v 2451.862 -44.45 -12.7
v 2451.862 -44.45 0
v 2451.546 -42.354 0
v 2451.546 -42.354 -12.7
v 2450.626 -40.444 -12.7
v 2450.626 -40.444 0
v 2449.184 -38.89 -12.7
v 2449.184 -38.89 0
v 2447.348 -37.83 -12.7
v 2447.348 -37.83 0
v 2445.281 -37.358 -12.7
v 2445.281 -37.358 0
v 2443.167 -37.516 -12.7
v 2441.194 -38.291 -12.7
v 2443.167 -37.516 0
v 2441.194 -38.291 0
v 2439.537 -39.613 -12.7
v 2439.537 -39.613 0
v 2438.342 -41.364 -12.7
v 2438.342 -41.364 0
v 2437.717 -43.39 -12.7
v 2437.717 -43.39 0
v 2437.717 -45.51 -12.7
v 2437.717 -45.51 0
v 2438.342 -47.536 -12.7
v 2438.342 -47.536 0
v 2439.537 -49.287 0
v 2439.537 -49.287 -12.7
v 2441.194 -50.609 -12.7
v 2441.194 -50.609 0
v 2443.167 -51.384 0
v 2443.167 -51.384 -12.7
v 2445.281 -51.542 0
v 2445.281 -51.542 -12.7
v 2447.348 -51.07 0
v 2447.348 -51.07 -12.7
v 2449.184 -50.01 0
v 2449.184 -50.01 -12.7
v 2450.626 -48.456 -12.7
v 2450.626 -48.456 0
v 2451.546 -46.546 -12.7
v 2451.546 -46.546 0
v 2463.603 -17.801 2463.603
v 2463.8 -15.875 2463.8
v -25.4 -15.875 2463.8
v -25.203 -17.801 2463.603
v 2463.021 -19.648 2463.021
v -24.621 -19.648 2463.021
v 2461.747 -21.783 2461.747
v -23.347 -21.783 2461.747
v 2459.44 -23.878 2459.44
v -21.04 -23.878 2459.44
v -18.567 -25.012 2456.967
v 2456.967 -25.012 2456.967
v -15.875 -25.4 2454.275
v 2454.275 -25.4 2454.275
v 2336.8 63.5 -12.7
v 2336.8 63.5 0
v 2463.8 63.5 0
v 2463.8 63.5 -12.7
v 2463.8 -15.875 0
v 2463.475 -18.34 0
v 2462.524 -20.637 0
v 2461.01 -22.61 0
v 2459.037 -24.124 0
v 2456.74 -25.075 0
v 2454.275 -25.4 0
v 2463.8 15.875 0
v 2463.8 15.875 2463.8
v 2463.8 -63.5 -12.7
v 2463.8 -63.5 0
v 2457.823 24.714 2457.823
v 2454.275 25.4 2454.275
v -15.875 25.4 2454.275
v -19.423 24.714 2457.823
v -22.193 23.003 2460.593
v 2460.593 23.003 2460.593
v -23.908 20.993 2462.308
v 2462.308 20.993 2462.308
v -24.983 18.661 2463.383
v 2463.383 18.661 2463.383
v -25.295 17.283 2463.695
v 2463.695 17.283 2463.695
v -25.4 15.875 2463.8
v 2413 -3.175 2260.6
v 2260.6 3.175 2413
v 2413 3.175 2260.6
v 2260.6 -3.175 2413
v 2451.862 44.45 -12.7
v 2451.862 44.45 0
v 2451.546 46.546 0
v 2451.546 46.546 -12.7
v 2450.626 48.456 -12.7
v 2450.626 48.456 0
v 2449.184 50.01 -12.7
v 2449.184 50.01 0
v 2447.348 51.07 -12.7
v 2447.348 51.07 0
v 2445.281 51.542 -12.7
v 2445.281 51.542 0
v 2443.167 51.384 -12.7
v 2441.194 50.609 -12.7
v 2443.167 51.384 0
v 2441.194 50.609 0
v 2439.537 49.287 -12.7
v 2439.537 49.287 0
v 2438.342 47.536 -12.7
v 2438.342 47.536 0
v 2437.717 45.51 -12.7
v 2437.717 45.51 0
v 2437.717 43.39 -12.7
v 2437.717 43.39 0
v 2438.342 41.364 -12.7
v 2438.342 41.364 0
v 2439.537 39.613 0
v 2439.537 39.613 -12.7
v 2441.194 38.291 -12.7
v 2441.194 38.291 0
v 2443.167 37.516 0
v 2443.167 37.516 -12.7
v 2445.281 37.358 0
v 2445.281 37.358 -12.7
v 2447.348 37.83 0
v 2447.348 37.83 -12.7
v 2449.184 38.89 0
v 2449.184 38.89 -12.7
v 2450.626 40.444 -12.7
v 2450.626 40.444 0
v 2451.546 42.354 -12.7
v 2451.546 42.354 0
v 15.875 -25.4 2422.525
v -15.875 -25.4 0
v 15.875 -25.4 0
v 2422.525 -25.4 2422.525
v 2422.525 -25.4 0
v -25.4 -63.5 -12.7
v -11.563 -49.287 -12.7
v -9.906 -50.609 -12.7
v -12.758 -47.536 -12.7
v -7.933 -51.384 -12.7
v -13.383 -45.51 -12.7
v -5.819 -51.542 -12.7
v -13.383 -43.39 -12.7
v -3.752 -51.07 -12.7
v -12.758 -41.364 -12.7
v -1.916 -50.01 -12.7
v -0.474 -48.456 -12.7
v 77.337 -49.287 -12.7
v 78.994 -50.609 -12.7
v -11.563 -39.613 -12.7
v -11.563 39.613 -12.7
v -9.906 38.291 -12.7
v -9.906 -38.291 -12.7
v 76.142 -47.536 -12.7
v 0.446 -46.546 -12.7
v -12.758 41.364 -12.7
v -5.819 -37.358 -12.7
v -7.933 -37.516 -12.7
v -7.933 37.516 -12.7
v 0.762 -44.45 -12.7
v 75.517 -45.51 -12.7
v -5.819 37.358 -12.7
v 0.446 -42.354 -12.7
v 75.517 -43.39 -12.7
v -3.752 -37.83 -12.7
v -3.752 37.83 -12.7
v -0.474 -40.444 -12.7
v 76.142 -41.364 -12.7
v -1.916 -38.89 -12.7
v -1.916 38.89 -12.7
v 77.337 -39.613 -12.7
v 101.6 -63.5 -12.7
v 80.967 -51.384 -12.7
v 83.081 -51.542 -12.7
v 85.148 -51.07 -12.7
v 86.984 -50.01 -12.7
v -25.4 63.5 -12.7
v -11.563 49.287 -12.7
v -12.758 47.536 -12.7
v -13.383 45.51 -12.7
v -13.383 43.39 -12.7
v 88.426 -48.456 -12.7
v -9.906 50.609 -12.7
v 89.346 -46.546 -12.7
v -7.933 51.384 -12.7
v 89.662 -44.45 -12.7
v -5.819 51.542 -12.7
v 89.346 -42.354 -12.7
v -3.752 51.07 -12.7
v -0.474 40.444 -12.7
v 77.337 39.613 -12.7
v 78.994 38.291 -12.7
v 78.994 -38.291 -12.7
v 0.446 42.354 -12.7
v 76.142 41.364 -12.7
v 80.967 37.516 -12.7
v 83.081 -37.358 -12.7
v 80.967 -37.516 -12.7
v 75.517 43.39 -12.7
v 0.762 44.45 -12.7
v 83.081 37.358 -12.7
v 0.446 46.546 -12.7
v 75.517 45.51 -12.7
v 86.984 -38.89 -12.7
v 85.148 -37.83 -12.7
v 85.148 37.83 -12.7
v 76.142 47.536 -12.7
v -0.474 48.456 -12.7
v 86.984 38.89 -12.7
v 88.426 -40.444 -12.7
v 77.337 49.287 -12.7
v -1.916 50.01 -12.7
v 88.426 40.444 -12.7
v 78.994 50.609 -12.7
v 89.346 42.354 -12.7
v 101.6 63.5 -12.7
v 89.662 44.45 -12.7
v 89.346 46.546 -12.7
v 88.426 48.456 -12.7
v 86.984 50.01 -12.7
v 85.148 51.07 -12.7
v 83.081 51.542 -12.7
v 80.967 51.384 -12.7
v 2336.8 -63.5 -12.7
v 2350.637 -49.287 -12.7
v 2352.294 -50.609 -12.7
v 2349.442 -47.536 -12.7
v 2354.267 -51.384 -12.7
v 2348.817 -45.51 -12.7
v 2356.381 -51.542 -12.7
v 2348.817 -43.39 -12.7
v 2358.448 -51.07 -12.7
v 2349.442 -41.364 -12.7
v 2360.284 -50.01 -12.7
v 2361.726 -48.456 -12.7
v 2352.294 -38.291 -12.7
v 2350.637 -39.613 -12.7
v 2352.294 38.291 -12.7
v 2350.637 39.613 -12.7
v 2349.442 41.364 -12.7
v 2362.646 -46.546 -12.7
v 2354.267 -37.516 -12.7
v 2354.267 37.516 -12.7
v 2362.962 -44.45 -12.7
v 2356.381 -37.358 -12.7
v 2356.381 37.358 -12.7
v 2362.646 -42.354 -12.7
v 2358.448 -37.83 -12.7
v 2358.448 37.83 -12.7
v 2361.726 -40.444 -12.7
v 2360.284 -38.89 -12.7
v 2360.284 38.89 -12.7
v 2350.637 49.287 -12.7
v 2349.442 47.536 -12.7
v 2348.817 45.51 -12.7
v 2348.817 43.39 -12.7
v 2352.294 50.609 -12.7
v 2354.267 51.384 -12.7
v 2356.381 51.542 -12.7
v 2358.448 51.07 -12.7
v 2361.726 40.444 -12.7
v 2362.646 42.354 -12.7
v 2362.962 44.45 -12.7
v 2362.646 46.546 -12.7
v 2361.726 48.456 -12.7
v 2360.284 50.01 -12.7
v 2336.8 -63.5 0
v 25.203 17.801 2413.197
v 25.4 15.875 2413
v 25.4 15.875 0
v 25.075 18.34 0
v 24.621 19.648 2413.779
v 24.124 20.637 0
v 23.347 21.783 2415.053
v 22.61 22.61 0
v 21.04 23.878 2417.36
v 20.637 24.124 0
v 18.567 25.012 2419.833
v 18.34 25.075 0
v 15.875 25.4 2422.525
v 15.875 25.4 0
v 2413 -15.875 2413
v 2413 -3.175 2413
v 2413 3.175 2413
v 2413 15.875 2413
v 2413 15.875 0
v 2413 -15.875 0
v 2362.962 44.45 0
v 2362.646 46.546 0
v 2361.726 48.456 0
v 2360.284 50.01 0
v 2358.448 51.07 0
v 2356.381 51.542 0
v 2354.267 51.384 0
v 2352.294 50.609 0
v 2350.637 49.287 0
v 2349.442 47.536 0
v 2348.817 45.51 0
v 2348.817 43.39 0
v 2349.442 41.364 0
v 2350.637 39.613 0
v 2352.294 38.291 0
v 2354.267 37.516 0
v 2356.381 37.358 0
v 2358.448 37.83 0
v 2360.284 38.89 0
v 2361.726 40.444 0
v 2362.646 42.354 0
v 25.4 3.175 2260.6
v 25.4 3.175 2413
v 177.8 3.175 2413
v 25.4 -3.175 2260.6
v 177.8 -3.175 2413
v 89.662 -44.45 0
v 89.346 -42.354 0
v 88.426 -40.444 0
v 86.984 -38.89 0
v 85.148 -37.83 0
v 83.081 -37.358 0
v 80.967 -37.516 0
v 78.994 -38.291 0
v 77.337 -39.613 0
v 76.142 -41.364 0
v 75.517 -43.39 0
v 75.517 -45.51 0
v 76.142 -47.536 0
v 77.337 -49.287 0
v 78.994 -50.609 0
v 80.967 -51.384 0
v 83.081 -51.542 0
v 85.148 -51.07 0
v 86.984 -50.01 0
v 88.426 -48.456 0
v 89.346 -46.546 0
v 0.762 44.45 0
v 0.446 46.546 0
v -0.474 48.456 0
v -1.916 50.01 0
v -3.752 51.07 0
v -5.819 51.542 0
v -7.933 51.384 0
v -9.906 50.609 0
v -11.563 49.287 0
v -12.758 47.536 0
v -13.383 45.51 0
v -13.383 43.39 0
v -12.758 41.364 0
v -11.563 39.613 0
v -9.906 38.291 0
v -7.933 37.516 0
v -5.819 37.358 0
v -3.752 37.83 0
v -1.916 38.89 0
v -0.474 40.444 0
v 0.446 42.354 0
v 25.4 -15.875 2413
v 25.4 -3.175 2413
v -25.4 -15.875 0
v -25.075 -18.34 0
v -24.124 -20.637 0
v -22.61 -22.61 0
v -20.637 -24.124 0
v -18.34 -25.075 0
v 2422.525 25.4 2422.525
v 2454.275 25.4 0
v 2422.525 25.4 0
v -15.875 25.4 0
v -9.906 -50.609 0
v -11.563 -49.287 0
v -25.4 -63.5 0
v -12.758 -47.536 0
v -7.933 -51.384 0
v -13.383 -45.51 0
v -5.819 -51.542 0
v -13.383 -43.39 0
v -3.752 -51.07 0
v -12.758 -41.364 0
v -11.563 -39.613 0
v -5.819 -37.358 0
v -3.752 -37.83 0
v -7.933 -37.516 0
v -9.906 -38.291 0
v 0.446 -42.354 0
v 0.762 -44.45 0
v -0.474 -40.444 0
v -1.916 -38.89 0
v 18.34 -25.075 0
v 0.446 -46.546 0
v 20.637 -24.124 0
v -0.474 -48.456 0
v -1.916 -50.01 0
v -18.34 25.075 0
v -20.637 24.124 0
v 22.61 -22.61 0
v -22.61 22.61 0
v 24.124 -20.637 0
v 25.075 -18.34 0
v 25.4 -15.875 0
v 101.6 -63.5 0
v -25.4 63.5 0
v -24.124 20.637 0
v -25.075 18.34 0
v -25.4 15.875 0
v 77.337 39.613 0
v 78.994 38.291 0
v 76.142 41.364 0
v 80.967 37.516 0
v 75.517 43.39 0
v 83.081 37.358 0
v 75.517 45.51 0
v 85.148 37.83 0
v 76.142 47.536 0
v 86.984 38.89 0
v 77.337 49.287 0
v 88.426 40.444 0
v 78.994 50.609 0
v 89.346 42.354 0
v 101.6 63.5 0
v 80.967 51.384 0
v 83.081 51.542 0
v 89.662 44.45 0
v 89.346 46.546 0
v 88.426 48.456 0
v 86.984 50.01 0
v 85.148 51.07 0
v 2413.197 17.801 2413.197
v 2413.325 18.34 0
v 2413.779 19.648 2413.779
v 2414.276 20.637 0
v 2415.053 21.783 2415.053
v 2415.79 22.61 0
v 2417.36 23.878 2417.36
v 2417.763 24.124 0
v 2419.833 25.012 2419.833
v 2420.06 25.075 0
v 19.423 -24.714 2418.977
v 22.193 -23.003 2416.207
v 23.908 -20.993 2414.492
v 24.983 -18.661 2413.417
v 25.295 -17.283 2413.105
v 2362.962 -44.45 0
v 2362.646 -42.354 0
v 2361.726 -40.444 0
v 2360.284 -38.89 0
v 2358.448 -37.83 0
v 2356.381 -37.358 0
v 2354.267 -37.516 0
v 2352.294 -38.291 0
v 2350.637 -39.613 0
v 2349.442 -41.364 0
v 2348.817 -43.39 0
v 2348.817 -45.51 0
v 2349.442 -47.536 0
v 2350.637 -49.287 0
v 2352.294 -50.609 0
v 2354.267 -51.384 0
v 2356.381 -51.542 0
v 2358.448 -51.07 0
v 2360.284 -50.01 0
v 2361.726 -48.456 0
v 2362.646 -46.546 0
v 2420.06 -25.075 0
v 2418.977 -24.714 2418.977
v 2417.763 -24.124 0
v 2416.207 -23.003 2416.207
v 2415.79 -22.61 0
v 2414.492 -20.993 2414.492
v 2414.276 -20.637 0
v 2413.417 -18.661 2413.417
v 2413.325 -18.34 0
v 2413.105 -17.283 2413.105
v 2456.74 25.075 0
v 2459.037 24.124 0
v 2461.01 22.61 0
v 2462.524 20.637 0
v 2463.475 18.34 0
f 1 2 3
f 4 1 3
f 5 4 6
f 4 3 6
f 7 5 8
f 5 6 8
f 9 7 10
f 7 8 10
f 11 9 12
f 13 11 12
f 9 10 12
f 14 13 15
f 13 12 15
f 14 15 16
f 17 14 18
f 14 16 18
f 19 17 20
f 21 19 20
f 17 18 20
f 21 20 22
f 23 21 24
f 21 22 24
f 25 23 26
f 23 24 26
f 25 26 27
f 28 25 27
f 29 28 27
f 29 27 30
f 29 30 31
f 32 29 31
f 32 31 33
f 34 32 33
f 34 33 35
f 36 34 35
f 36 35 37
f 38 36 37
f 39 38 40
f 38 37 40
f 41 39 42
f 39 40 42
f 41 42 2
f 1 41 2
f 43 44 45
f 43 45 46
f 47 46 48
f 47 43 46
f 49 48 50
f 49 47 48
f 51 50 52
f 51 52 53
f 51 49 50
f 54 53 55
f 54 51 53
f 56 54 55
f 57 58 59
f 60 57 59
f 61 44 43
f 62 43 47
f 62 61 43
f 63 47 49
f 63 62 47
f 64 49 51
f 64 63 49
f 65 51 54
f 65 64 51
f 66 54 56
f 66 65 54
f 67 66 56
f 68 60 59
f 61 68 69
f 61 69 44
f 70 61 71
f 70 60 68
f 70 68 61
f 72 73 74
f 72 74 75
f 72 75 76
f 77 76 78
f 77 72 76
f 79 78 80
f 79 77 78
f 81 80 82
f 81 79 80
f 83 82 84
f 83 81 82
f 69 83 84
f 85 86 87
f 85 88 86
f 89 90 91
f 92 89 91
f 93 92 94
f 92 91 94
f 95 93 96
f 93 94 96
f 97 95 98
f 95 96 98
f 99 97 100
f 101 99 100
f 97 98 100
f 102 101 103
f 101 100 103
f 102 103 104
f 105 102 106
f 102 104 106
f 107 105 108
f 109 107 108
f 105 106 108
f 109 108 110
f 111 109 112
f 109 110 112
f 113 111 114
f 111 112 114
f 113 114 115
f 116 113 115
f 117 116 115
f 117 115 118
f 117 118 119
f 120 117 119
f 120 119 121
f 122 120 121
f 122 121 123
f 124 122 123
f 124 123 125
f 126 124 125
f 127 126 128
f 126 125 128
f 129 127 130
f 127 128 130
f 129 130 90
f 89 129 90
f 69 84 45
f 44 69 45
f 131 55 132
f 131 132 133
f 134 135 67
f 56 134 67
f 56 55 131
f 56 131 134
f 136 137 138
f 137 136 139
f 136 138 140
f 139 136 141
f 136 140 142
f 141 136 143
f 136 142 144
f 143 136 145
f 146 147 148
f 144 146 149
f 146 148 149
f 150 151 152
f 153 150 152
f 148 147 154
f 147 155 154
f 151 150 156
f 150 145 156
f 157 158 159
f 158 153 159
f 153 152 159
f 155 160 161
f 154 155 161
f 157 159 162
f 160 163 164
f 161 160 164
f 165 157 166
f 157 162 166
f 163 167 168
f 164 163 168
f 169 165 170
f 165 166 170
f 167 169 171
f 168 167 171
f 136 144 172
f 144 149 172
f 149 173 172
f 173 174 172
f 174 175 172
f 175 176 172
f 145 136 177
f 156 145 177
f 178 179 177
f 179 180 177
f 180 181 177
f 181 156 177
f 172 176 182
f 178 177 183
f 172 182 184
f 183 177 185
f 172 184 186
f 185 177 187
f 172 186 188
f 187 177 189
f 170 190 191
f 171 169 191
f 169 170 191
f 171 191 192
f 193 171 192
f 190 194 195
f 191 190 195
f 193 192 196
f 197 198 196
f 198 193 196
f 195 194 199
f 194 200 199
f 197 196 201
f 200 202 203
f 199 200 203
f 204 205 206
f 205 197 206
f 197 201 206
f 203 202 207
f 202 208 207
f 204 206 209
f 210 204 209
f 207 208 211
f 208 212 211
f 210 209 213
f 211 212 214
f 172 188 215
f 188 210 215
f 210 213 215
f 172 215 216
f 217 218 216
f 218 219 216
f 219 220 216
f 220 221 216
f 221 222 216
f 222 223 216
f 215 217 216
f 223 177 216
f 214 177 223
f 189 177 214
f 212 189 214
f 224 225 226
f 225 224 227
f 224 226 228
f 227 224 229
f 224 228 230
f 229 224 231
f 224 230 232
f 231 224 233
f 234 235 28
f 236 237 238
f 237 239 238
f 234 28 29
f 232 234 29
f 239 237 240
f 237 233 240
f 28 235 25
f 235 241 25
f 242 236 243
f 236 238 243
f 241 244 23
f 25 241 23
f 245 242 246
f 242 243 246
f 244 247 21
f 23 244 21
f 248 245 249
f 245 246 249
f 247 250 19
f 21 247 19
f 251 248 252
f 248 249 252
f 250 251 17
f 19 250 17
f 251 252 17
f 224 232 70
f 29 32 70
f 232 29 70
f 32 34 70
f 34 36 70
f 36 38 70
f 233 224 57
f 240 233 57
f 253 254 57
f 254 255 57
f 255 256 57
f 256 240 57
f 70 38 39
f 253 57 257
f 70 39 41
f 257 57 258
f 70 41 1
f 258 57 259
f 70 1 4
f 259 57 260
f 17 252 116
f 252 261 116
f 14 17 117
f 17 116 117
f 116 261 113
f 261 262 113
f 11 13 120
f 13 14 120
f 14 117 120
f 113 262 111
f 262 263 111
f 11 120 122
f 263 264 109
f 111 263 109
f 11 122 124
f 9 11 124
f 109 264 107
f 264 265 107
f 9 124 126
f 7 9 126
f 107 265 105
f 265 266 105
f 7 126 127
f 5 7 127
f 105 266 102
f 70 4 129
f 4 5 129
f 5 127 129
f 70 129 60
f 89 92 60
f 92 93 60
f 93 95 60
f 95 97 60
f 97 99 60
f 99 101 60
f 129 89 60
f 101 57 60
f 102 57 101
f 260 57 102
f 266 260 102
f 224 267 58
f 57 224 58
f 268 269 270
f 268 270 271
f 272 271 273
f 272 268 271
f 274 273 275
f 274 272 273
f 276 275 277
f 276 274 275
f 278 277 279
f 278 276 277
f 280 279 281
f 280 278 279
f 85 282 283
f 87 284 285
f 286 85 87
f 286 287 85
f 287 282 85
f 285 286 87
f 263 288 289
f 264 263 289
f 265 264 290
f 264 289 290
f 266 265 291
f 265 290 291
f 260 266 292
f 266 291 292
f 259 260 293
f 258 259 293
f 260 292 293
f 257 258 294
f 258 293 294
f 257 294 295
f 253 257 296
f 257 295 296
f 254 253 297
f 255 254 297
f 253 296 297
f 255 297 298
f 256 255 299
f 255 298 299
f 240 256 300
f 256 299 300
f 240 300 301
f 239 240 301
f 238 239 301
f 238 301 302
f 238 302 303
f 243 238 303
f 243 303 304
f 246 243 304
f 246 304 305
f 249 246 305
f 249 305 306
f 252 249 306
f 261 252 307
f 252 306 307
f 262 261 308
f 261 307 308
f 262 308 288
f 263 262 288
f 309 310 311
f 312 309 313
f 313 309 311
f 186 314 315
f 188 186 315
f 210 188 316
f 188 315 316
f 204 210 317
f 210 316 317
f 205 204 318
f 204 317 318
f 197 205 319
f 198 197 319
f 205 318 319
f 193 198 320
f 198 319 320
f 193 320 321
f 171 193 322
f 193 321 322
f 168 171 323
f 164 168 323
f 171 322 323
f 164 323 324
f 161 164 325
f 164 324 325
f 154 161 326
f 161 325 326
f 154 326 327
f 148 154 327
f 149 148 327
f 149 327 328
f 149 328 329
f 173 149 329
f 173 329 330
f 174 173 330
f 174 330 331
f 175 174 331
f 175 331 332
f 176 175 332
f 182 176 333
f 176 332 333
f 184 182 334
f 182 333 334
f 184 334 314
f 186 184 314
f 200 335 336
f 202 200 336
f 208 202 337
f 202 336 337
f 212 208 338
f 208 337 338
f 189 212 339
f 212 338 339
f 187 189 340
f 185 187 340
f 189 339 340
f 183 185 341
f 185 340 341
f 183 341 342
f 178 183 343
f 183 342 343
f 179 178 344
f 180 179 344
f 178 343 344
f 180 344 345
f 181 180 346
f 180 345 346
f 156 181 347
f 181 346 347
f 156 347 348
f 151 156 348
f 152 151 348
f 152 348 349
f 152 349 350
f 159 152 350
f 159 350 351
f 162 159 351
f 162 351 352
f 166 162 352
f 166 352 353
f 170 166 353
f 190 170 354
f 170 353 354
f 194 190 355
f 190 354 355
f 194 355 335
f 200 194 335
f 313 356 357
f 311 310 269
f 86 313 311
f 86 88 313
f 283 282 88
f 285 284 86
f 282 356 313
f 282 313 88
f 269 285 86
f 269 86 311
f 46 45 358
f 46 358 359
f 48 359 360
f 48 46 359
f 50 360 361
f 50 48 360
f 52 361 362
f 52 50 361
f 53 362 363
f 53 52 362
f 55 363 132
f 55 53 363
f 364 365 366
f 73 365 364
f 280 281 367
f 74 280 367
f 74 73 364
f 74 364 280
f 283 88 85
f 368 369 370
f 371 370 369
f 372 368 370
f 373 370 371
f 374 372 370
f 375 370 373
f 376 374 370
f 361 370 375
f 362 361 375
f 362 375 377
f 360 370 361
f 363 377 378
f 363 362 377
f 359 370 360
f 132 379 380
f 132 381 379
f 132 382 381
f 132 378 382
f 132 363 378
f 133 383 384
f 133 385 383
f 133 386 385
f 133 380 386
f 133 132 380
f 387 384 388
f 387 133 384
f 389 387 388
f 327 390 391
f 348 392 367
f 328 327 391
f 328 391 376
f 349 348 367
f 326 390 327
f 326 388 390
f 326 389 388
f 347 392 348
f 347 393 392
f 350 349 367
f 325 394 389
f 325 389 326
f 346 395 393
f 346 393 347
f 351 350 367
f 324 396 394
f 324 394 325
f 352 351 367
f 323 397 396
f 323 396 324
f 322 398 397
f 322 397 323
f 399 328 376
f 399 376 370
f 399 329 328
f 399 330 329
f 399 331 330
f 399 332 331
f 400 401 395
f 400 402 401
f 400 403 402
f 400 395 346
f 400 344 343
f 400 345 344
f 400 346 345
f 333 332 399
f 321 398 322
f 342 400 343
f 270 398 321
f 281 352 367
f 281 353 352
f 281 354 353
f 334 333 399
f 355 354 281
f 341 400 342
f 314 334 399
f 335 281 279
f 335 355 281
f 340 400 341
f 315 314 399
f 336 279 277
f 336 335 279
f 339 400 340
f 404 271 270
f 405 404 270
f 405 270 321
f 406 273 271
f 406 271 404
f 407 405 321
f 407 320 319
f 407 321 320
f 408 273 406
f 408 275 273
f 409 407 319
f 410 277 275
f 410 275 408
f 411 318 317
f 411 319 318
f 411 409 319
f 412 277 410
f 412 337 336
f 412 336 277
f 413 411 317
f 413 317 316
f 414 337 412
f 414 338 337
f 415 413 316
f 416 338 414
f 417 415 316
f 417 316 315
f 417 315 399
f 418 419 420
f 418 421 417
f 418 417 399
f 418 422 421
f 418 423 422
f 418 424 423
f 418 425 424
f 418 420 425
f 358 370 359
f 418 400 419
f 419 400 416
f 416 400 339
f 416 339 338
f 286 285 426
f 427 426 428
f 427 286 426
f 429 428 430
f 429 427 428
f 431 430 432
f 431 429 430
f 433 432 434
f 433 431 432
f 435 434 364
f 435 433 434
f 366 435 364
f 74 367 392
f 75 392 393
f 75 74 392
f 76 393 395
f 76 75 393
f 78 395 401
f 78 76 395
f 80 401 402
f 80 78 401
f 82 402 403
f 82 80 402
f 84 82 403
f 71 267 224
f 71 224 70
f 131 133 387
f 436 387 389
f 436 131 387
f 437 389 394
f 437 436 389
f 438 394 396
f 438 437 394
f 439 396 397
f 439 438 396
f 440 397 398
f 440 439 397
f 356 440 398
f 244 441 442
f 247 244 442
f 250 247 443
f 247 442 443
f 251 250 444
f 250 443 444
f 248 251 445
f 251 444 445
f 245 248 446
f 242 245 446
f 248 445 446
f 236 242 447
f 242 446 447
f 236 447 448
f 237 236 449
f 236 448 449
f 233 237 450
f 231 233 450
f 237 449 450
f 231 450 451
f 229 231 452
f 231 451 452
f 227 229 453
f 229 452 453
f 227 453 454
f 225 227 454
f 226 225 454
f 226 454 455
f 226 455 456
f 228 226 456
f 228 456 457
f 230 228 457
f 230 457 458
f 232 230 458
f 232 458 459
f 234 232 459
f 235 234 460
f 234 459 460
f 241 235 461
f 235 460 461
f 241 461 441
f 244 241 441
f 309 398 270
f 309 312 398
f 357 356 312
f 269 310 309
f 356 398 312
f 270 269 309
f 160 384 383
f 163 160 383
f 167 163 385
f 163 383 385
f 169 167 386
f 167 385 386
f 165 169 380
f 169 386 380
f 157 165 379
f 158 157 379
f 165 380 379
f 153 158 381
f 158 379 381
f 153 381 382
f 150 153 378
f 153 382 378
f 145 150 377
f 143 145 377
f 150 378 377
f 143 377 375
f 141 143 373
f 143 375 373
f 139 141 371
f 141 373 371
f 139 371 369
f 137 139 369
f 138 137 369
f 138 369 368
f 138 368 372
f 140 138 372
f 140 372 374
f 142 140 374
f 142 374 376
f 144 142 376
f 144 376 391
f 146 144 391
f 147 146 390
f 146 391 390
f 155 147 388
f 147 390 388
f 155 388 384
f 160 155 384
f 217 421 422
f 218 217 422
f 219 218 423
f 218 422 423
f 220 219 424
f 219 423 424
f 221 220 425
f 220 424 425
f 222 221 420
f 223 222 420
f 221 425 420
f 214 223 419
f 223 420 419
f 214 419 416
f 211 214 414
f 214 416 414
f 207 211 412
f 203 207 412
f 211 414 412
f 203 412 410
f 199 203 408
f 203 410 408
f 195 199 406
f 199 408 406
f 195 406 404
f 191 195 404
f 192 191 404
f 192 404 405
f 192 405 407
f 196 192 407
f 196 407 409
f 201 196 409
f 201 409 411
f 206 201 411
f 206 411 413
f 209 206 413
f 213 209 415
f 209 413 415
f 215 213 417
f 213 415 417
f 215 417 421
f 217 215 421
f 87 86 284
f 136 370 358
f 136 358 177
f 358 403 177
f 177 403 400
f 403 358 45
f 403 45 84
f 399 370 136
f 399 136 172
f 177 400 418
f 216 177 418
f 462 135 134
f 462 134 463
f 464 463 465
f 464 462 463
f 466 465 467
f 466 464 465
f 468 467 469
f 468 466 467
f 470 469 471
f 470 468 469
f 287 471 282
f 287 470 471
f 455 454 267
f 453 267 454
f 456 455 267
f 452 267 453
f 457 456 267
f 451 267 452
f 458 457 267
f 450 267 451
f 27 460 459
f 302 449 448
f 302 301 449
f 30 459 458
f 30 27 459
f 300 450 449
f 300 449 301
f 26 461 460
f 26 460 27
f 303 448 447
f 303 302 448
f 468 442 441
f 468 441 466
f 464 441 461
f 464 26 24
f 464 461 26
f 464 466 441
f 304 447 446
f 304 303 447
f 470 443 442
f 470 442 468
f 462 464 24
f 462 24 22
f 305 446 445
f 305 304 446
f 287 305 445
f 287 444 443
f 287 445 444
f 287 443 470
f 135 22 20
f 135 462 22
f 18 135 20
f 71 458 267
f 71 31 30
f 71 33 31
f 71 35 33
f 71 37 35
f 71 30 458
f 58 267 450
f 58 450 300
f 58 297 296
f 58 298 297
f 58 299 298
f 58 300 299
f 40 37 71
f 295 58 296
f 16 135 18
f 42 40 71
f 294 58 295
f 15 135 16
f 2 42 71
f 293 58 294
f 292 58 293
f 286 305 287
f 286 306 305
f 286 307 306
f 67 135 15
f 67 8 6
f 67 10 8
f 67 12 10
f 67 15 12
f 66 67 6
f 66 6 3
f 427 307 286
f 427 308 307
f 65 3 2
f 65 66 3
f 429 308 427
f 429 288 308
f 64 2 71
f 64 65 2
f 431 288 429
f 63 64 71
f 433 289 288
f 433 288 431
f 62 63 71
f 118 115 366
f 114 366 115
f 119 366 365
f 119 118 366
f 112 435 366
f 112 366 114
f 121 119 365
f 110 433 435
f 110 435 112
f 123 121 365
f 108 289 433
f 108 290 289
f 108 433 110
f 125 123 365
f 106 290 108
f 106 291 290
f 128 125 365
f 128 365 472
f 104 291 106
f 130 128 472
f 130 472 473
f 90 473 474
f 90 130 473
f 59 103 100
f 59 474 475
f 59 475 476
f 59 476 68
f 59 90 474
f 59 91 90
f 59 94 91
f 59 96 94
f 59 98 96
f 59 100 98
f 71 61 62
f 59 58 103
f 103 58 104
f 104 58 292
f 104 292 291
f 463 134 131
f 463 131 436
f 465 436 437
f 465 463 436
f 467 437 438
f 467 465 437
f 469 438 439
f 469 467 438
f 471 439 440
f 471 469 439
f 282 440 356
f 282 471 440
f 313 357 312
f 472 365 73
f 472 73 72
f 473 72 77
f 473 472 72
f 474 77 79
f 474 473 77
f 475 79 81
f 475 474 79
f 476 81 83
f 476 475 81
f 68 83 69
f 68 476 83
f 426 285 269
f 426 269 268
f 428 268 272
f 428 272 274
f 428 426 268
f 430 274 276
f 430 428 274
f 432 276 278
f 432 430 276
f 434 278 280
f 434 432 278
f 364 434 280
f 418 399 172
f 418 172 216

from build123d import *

# Parameters (mm, degrees)
F3_W     = 127
F3_H     = 127
F3_R     = 7.112
F4_DEPTH = 12.7
F6_DEPTH = 3.175


with BuildPart() as f2:
    # F2: sweep along a path in F0
    with BuildLine(Plane.XZ) as f2_path:
        Line((0, 0), (0, 2438.4))
        Line((0, 2438.4), (2438.4, 2438.4))
        Line((2438.4, 2438.4), (2438.4, 0))
    # F1 (on Top) → F2 (sweep)
    with BuildSketch(Plane.XY):
        with BuildLine():
            Line((15.875, 25.4), (-15.875, 25.4))
            ThreePointArc((-15.875, 25.4), (-22.6101920908, 22.6101920908), (-25.4, 15.875))
            Line((-25.4, 15.875), (-25.4, -15.875))
            ThreePointArc((-25.4, -15.875), (-22.6101920908, -22.6101920908), (-15.875, -25.4))
            Line((-15.875, -25.4), (15.875, -25.4))
            ThreePointArc((15.875, -25.4), (22.6101920908, -22.6101920908), (25.4, -15.875))
            Line((25.4, -15.875), (25.4, 15.875))
            ThreePointArc((25.4, 15.875), (22.6101920908, 22.6101920908), (15.875, 25.4))
        make_face()
    sweep(path=f2_path.line, transition=Transition.RIGHT)

    # F3 (on Top) → F4 (join)
    with BuildSketch(Plane.XY):
        with Locations((38.1, 0)):
            Rectangle(F3_W, F3_H)
        with Locations((-6.35, -44.45)):
            Circle(F3_R, mode=Mode.SUBTRACT)
        with Locations((82.55, -44.45)):
            Circle(F3_R, mode=Mode.SUBTRACT)
        with Locations((-6.35, 44.45)):
            Circle(F3_R, mode=Mode.SUBTRACT)
        with Locations((82.55, 44.45)):
            Circle(F3_R, mode=Mode.SUBTRACT)
        with Locations((2400.3, 0)):
            Rectangle(F3_W, F3_H)
        with Locations((2355.85, -44.45)):
            Circle(F3_R, mode=Mode.SUBTRACT)
        with Locations((2444.75, -44.45)):
            Circle(F3_R, mode=Mode.SUBTRACT)
        with Locations((2355.85, 44.45)):
            Circle(F3_R, mode=Mode.SUBTRACT)
        with Locations((2444.75, 44.45)):
            Circle(F3_R, mode=Mode.SUBTRACT)
    extrude(amount=-F4_DEPTH)

    # F5 (on Front) → F6 (join, symmetric)
    with BuildSketch(Plane.XZ):
        Polygon((177.8, 2413), (25.4, 2413), (25.4, 2260.6), align=None)
        Polygon((2413, 2260.6), (2413, 2413), (2260.6, 2413), align=None)
    extrude(amount=F6_DEPTH, both=True)


solid = f2.part
